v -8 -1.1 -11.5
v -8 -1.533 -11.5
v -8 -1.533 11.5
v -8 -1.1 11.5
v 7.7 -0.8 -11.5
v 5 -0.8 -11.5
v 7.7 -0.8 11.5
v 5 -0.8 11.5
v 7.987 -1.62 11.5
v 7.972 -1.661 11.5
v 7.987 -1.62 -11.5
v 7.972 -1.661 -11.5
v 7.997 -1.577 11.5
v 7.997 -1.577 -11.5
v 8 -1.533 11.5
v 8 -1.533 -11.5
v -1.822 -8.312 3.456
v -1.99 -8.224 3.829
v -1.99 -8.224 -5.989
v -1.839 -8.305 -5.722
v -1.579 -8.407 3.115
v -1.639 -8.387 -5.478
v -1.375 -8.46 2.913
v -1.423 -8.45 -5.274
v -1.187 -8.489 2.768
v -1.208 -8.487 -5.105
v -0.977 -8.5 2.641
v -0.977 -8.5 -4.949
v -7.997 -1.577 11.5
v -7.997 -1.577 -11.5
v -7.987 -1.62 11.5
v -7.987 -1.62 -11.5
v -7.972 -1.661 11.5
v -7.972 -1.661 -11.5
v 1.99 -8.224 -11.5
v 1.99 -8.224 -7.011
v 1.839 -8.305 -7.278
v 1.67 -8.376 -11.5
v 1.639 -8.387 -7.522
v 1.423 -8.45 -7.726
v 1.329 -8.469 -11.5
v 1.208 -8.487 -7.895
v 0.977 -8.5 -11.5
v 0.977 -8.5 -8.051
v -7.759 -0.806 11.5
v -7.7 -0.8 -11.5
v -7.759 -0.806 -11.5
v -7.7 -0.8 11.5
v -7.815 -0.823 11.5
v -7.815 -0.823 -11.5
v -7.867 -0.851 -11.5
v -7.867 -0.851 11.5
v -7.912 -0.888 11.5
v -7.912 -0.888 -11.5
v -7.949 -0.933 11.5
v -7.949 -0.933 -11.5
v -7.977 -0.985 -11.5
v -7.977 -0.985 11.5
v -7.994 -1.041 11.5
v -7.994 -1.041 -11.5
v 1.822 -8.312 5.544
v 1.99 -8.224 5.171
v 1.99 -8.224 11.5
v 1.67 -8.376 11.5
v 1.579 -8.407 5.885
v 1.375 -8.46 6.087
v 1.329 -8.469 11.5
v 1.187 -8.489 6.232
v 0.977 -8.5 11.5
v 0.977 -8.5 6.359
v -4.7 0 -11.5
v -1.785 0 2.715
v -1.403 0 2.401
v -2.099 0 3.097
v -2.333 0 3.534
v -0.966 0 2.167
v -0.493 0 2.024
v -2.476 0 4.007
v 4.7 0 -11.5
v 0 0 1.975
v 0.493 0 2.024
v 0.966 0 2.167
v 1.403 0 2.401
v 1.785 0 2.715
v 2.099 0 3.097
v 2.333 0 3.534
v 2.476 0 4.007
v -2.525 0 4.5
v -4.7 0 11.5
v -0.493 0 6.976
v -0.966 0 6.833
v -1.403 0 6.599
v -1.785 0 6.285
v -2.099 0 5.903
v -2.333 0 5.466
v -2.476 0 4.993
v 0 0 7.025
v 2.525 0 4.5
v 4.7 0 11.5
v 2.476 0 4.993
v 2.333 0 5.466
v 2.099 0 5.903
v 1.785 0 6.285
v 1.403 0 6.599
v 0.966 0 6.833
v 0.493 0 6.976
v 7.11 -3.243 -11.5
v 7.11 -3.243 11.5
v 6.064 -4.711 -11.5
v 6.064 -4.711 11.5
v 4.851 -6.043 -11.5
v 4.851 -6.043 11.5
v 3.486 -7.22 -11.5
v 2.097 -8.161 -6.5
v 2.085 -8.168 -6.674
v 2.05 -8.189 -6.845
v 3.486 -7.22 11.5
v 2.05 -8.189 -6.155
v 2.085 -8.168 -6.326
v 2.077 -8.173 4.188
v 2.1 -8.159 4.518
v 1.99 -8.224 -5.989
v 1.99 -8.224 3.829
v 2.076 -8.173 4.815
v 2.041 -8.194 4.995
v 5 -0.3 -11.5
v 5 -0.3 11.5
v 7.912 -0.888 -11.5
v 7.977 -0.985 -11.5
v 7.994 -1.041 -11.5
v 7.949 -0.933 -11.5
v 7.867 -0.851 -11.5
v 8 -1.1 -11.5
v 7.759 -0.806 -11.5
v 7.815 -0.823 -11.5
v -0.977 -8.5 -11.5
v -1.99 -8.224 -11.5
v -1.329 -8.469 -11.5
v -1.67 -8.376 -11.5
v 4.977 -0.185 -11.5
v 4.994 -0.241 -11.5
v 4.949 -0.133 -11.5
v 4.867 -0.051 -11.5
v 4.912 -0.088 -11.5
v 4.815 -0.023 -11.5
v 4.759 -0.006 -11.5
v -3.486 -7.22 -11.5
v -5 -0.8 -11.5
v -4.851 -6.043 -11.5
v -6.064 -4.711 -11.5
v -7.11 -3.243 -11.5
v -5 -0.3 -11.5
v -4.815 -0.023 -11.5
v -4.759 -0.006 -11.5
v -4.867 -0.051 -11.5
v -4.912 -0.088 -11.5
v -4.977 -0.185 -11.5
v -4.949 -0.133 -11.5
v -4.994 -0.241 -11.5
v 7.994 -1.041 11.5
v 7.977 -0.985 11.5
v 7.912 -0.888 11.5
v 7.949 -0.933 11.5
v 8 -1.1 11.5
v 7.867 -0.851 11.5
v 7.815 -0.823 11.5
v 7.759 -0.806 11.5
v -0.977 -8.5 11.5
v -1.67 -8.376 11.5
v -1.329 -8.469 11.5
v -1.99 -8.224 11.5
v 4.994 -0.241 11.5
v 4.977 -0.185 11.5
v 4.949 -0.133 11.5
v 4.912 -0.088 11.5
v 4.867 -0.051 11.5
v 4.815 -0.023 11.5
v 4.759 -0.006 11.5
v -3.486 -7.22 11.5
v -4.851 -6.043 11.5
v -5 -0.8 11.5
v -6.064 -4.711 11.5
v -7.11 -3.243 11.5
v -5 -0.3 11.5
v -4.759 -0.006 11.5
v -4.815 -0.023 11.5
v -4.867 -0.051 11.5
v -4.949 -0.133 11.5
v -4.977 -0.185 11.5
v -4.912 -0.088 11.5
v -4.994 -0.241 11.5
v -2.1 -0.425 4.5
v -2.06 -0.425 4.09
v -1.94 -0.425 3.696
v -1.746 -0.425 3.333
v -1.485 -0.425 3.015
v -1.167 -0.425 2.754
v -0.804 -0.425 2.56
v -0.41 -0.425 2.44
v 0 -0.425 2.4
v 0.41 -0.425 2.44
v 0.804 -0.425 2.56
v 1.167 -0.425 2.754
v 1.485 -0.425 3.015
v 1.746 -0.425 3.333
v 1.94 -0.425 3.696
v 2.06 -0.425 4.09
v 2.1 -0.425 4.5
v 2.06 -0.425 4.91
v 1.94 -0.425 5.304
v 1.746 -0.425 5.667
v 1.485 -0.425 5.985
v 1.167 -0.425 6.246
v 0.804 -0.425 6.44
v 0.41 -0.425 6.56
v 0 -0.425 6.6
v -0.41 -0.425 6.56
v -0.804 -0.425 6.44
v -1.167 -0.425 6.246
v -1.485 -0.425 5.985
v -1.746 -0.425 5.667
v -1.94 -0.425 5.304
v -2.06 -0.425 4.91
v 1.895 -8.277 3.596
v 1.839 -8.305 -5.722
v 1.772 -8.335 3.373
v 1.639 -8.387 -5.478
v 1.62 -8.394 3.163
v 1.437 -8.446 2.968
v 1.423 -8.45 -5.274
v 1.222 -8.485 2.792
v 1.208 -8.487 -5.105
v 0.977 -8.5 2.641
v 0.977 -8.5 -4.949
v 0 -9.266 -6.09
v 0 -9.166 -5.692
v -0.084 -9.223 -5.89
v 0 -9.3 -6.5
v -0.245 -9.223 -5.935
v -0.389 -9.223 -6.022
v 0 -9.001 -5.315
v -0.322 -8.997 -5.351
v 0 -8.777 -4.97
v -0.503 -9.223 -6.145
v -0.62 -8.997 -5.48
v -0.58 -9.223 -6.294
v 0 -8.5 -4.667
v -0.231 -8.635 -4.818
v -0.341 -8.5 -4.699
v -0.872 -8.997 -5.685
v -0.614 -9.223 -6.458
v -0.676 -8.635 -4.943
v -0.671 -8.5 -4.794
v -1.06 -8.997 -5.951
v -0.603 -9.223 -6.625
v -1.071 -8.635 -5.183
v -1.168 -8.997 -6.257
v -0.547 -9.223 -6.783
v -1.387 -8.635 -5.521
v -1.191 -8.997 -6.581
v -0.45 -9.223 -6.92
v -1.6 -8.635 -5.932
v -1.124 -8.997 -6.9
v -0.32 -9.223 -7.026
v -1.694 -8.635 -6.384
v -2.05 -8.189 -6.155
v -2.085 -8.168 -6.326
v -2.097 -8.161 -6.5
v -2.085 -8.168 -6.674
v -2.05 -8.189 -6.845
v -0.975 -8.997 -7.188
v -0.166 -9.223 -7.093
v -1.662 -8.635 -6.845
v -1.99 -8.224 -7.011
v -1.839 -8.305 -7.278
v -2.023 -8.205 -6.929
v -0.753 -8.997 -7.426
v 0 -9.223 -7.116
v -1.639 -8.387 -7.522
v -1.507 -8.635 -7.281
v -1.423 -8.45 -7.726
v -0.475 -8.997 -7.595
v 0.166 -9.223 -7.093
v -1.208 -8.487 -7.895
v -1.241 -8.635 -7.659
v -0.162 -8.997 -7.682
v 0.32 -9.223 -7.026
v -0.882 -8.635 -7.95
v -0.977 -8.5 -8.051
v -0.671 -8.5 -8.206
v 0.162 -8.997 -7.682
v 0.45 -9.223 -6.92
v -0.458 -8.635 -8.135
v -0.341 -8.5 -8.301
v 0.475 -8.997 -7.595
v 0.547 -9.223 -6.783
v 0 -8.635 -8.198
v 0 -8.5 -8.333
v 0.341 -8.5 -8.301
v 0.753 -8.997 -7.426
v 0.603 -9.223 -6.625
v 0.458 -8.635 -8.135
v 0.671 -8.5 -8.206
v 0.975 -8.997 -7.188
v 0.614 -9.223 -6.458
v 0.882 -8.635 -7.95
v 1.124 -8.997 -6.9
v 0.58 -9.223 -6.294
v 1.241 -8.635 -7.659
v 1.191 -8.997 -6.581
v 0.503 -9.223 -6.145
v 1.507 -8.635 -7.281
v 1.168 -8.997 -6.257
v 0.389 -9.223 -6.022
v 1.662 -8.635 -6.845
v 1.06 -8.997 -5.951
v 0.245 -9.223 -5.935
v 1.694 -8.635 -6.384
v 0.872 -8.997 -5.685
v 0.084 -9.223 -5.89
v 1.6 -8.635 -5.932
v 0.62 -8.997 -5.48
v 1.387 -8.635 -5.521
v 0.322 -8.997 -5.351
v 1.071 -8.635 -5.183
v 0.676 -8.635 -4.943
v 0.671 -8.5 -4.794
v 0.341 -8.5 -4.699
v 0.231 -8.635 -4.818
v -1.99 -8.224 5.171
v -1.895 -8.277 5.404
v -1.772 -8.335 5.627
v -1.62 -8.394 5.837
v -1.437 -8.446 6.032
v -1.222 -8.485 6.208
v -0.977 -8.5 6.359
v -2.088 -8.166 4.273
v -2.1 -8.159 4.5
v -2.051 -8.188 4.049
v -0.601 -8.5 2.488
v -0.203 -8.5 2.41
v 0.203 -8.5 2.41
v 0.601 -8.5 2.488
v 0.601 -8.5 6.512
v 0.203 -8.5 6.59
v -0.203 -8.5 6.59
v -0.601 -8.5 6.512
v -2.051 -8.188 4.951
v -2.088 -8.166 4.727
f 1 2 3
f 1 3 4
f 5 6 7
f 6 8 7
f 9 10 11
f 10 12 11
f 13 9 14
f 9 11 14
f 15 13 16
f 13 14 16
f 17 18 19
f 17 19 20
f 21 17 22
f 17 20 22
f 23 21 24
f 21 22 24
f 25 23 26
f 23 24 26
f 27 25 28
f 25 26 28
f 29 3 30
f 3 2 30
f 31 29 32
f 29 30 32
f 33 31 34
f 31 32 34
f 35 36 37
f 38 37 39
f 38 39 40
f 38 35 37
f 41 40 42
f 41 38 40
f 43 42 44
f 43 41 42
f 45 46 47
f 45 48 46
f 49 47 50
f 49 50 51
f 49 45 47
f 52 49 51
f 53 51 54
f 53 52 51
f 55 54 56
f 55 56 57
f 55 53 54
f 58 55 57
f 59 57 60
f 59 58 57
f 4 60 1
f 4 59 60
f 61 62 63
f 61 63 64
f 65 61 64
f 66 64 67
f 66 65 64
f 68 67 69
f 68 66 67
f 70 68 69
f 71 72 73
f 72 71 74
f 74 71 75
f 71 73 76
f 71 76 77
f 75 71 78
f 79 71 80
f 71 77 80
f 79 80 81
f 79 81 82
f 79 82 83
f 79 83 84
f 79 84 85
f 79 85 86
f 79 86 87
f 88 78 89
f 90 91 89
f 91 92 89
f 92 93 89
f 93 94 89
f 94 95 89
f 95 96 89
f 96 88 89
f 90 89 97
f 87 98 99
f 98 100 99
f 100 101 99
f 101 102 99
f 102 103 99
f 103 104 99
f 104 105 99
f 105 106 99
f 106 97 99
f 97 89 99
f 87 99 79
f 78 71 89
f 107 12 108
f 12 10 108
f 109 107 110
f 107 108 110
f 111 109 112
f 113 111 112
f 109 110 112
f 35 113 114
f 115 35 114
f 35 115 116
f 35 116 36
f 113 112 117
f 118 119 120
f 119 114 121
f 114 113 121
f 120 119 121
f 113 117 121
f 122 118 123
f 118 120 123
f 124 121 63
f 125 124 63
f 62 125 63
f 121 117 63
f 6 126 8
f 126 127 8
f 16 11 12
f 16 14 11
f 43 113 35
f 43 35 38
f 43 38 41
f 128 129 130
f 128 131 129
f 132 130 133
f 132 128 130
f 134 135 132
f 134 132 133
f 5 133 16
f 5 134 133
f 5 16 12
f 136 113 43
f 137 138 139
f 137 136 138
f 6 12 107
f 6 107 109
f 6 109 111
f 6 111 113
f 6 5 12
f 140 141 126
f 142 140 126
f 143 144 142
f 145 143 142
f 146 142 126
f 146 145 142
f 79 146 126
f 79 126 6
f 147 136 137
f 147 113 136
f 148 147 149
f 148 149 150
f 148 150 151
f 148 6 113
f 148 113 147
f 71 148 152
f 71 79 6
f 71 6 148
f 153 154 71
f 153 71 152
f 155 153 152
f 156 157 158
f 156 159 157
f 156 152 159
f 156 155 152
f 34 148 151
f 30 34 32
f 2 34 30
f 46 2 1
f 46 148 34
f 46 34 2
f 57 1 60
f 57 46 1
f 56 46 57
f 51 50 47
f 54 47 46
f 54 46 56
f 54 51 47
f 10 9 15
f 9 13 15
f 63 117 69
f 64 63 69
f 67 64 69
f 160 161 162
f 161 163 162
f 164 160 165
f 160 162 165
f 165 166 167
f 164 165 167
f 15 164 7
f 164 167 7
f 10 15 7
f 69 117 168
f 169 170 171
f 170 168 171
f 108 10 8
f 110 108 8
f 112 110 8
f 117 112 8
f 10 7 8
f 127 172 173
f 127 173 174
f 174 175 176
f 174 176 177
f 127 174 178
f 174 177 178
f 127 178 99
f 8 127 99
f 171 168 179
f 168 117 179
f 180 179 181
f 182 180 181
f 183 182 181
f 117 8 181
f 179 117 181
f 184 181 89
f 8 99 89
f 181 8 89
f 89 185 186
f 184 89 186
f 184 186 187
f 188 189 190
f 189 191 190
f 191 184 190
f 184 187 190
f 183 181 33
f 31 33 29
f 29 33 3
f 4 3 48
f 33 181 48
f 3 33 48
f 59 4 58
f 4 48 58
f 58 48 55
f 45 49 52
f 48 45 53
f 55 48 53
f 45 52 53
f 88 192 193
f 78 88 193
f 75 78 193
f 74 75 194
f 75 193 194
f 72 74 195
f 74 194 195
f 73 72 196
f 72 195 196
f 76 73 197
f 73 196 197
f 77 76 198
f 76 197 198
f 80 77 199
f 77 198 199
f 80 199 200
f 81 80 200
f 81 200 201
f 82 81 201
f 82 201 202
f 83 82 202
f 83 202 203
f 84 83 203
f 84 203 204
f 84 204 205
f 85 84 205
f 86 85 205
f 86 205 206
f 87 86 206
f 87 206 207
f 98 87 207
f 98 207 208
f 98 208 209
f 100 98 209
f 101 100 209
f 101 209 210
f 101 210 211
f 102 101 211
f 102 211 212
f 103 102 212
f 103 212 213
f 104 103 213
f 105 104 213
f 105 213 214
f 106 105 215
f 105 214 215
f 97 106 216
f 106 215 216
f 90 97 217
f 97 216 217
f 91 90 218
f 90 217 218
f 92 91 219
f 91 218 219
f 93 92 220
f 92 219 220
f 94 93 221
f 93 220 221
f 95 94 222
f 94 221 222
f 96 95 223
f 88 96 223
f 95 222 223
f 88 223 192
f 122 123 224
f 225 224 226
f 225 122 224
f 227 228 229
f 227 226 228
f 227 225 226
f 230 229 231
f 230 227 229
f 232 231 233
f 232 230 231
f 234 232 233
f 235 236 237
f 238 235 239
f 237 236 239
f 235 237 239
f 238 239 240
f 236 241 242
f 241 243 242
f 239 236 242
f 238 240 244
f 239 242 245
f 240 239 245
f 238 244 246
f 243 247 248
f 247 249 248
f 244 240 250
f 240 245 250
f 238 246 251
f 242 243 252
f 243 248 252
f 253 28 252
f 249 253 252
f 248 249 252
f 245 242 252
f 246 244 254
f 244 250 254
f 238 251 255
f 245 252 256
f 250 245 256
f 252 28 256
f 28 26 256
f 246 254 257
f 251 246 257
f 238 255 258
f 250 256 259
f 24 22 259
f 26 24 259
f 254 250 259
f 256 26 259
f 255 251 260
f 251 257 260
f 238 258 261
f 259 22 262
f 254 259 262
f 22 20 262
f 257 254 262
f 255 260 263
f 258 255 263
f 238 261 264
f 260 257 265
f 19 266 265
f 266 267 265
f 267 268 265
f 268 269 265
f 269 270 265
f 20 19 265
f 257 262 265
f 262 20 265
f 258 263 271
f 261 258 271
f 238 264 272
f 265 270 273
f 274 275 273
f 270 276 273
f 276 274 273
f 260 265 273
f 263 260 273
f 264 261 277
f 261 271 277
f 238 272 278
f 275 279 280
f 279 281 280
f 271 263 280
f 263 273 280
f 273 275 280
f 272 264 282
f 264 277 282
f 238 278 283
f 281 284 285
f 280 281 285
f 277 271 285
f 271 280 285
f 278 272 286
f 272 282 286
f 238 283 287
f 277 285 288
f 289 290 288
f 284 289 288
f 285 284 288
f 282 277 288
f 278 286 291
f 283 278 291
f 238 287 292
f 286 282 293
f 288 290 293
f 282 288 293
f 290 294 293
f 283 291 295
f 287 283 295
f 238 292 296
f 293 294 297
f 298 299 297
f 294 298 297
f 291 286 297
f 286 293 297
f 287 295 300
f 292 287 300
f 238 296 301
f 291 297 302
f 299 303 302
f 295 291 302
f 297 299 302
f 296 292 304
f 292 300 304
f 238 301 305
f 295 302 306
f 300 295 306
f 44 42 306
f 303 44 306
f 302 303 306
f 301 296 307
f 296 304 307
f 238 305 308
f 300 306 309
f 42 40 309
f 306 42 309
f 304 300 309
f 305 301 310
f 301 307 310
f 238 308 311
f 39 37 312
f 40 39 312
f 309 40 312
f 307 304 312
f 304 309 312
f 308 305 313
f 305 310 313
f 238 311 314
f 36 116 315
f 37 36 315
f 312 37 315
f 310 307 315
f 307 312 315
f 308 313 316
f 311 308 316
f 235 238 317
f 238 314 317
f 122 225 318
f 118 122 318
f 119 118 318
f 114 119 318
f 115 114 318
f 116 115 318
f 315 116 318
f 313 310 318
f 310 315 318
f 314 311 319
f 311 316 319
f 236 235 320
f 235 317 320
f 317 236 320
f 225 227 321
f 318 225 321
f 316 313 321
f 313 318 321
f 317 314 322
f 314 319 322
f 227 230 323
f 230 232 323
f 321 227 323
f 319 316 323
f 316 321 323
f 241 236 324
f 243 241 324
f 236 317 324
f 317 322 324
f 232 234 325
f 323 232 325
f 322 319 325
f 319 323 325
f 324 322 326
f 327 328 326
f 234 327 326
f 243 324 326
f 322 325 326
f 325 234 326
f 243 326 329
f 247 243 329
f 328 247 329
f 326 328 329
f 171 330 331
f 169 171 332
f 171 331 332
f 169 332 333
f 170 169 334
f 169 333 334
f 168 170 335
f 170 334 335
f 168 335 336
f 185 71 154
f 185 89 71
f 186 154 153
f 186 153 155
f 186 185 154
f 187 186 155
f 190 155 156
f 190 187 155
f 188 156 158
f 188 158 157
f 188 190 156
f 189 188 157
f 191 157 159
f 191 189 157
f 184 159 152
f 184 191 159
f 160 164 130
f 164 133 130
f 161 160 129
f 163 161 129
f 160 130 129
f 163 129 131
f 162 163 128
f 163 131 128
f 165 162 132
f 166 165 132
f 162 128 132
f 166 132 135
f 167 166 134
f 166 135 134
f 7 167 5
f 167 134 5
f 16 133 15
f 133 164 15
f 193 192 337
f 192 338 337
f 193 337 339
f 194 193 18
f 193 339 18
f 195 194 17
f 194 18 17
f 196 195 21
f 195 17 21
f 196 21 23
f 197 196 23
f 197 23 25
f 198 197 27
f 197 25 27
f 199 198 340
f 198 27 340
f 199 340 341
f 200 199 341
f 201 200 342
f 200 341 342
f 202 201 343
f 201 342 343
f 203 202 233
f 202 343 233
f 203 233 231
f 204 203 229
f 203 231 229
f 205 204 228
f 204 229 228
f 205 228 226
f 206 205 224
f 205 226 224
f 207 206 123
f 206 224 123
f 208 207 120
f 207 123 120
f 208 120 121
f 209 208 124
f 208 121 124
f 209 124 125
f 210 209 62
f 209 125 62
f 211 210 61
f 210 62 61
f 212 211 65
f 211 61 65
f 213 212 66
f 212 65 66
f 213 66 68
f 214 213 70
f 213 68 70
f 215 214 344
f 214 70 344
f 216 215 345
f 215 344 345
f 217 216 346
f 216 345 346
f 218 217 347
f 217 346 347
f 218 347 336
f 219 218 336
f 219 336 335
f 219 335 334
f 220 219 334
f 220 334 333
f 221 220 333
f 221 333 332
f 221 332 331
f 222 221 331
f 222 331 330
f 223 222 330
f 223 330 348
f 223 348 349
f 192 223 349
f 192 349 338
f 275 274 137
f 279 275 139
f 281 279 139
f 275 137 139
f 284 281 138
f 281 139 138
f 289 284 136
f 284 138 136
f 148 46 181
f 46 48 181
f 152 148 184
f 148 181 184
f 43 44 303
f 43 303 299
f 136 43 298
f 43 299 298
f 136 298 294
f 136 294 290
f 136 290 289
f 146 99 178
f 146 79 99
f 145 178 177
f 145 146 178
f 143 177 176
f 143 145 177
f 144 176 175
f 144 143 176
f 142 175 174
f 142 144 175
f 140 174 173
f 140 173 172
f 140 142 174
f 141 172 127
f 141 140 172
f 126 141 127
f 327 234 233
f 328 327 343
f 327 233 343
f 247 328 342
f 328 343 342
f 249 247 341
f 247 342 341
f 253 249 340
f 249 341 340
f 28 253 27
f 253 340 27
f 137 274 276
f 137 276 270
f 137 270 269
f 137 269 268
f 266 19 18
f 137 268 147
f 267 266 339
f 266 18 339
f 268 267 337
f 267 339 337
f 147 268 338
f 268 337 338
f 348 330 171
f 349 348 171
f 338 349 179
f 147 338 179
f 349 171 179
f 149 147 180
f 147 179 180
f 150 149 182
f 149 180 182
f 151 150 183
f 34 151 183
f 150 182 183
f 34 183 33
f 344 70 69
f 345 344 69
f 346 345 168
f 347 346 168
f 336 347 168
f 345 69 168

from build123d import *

# Parameters (mm, degrees)
EXTRUDE_1_DEPTH             = 11.5
FILLET_1_R                  = 0.3
FILLET_2_R                  = 2
HOLE_WIZARD_M53_D           = 4.2
HOLE_WIZARD_M53_CSINK_D     = 5.05
HOLE_WIZARD_M53_CSINK_ANGLE = 90


with BuildPart() as part:
    # Эскиз1 → Бобышка-Вытянуть1 (new body, symmetric)
    with BuildSketch(Plane.XY):
        with BuildLine():
            Line((-5, 0), (5, 0))
            Line((5, 0), (5, -0.8))
            Line((5, -0.8), (8, -0.8))
            Line((8, -0.8), (8, -1.6))
            ThreePointArc((8, -1.6), (5.309398779, -5.576969864), (1.5, -8.5))
            Line((1.5, -8.5), (-1.5, -8.5))
            ThreePointArc((-1.5, -8.5), (-5.309398779, -5.576969864), (-8, -1.6))
            Line((-8, -1.6), (-8, -0.8))
            Line((-8, -0.8), (-5, -0.8))
            Line((-5, -0.8), (-5, 0))
        make_face()
    extrude(amount=EXTRUDE_1_DEPTH, both=True)

    # Скругление1
    fillet_1_edges = [part.edges().sort_by_distance(p)[0] for p in [
        (8, -0.8, 0),
        (8, -1.6, 0),
        (-8, -1.6, 0),
        (-8, -0.8, 0),
        (-5, 0, 0),
        (5, 0, 0),
    ]]
    fillet(fillet_1_edges, radius=FILLET_1_R)

    # Скругление2
    fillet_2_edges = [part.edges().sort_by_distance(p)[0] for p in [
        (1.5, -8.5, 0),
        (-1.5, -8.5, 0),
    ]]
    fillet(fillet_2_edges, radius=FILLET_2_R)

    # Отверстие обработанное метчиком M53 (through all)
    with Locations(Plane(origin=(0, 0, 0), x_dir=(1, 0, 0), z_dir=(0, 1, 0))):
        with Locations((0, -4.5)):
            CounterSinkHole(HOLE_WIZARD_M53_D / 2, HOLE_WIZARD_M53_CSINK_D / 2, counter_sink_angle=HOLE_WIZARD_M53_CSINK_ANGLE)

    # Эскиз5 → Повернуть1 (revolve)
    with BuildSketch(Plane(origin=(0, 0, 0), x_dir=(0, 0, -1), z_dir=(1, 0, 0))):
        with BuildLine():
            Line((6.5, -4.3), (6.5, -9.3))
            ThreePointArc((6.5, -9.3), (4, -6.8), (6.5, -4.3))
        make_face()
    revolve(axis=Axis((0, -4.3, -6.5), (0, -1, 0)))


solid = part.part
